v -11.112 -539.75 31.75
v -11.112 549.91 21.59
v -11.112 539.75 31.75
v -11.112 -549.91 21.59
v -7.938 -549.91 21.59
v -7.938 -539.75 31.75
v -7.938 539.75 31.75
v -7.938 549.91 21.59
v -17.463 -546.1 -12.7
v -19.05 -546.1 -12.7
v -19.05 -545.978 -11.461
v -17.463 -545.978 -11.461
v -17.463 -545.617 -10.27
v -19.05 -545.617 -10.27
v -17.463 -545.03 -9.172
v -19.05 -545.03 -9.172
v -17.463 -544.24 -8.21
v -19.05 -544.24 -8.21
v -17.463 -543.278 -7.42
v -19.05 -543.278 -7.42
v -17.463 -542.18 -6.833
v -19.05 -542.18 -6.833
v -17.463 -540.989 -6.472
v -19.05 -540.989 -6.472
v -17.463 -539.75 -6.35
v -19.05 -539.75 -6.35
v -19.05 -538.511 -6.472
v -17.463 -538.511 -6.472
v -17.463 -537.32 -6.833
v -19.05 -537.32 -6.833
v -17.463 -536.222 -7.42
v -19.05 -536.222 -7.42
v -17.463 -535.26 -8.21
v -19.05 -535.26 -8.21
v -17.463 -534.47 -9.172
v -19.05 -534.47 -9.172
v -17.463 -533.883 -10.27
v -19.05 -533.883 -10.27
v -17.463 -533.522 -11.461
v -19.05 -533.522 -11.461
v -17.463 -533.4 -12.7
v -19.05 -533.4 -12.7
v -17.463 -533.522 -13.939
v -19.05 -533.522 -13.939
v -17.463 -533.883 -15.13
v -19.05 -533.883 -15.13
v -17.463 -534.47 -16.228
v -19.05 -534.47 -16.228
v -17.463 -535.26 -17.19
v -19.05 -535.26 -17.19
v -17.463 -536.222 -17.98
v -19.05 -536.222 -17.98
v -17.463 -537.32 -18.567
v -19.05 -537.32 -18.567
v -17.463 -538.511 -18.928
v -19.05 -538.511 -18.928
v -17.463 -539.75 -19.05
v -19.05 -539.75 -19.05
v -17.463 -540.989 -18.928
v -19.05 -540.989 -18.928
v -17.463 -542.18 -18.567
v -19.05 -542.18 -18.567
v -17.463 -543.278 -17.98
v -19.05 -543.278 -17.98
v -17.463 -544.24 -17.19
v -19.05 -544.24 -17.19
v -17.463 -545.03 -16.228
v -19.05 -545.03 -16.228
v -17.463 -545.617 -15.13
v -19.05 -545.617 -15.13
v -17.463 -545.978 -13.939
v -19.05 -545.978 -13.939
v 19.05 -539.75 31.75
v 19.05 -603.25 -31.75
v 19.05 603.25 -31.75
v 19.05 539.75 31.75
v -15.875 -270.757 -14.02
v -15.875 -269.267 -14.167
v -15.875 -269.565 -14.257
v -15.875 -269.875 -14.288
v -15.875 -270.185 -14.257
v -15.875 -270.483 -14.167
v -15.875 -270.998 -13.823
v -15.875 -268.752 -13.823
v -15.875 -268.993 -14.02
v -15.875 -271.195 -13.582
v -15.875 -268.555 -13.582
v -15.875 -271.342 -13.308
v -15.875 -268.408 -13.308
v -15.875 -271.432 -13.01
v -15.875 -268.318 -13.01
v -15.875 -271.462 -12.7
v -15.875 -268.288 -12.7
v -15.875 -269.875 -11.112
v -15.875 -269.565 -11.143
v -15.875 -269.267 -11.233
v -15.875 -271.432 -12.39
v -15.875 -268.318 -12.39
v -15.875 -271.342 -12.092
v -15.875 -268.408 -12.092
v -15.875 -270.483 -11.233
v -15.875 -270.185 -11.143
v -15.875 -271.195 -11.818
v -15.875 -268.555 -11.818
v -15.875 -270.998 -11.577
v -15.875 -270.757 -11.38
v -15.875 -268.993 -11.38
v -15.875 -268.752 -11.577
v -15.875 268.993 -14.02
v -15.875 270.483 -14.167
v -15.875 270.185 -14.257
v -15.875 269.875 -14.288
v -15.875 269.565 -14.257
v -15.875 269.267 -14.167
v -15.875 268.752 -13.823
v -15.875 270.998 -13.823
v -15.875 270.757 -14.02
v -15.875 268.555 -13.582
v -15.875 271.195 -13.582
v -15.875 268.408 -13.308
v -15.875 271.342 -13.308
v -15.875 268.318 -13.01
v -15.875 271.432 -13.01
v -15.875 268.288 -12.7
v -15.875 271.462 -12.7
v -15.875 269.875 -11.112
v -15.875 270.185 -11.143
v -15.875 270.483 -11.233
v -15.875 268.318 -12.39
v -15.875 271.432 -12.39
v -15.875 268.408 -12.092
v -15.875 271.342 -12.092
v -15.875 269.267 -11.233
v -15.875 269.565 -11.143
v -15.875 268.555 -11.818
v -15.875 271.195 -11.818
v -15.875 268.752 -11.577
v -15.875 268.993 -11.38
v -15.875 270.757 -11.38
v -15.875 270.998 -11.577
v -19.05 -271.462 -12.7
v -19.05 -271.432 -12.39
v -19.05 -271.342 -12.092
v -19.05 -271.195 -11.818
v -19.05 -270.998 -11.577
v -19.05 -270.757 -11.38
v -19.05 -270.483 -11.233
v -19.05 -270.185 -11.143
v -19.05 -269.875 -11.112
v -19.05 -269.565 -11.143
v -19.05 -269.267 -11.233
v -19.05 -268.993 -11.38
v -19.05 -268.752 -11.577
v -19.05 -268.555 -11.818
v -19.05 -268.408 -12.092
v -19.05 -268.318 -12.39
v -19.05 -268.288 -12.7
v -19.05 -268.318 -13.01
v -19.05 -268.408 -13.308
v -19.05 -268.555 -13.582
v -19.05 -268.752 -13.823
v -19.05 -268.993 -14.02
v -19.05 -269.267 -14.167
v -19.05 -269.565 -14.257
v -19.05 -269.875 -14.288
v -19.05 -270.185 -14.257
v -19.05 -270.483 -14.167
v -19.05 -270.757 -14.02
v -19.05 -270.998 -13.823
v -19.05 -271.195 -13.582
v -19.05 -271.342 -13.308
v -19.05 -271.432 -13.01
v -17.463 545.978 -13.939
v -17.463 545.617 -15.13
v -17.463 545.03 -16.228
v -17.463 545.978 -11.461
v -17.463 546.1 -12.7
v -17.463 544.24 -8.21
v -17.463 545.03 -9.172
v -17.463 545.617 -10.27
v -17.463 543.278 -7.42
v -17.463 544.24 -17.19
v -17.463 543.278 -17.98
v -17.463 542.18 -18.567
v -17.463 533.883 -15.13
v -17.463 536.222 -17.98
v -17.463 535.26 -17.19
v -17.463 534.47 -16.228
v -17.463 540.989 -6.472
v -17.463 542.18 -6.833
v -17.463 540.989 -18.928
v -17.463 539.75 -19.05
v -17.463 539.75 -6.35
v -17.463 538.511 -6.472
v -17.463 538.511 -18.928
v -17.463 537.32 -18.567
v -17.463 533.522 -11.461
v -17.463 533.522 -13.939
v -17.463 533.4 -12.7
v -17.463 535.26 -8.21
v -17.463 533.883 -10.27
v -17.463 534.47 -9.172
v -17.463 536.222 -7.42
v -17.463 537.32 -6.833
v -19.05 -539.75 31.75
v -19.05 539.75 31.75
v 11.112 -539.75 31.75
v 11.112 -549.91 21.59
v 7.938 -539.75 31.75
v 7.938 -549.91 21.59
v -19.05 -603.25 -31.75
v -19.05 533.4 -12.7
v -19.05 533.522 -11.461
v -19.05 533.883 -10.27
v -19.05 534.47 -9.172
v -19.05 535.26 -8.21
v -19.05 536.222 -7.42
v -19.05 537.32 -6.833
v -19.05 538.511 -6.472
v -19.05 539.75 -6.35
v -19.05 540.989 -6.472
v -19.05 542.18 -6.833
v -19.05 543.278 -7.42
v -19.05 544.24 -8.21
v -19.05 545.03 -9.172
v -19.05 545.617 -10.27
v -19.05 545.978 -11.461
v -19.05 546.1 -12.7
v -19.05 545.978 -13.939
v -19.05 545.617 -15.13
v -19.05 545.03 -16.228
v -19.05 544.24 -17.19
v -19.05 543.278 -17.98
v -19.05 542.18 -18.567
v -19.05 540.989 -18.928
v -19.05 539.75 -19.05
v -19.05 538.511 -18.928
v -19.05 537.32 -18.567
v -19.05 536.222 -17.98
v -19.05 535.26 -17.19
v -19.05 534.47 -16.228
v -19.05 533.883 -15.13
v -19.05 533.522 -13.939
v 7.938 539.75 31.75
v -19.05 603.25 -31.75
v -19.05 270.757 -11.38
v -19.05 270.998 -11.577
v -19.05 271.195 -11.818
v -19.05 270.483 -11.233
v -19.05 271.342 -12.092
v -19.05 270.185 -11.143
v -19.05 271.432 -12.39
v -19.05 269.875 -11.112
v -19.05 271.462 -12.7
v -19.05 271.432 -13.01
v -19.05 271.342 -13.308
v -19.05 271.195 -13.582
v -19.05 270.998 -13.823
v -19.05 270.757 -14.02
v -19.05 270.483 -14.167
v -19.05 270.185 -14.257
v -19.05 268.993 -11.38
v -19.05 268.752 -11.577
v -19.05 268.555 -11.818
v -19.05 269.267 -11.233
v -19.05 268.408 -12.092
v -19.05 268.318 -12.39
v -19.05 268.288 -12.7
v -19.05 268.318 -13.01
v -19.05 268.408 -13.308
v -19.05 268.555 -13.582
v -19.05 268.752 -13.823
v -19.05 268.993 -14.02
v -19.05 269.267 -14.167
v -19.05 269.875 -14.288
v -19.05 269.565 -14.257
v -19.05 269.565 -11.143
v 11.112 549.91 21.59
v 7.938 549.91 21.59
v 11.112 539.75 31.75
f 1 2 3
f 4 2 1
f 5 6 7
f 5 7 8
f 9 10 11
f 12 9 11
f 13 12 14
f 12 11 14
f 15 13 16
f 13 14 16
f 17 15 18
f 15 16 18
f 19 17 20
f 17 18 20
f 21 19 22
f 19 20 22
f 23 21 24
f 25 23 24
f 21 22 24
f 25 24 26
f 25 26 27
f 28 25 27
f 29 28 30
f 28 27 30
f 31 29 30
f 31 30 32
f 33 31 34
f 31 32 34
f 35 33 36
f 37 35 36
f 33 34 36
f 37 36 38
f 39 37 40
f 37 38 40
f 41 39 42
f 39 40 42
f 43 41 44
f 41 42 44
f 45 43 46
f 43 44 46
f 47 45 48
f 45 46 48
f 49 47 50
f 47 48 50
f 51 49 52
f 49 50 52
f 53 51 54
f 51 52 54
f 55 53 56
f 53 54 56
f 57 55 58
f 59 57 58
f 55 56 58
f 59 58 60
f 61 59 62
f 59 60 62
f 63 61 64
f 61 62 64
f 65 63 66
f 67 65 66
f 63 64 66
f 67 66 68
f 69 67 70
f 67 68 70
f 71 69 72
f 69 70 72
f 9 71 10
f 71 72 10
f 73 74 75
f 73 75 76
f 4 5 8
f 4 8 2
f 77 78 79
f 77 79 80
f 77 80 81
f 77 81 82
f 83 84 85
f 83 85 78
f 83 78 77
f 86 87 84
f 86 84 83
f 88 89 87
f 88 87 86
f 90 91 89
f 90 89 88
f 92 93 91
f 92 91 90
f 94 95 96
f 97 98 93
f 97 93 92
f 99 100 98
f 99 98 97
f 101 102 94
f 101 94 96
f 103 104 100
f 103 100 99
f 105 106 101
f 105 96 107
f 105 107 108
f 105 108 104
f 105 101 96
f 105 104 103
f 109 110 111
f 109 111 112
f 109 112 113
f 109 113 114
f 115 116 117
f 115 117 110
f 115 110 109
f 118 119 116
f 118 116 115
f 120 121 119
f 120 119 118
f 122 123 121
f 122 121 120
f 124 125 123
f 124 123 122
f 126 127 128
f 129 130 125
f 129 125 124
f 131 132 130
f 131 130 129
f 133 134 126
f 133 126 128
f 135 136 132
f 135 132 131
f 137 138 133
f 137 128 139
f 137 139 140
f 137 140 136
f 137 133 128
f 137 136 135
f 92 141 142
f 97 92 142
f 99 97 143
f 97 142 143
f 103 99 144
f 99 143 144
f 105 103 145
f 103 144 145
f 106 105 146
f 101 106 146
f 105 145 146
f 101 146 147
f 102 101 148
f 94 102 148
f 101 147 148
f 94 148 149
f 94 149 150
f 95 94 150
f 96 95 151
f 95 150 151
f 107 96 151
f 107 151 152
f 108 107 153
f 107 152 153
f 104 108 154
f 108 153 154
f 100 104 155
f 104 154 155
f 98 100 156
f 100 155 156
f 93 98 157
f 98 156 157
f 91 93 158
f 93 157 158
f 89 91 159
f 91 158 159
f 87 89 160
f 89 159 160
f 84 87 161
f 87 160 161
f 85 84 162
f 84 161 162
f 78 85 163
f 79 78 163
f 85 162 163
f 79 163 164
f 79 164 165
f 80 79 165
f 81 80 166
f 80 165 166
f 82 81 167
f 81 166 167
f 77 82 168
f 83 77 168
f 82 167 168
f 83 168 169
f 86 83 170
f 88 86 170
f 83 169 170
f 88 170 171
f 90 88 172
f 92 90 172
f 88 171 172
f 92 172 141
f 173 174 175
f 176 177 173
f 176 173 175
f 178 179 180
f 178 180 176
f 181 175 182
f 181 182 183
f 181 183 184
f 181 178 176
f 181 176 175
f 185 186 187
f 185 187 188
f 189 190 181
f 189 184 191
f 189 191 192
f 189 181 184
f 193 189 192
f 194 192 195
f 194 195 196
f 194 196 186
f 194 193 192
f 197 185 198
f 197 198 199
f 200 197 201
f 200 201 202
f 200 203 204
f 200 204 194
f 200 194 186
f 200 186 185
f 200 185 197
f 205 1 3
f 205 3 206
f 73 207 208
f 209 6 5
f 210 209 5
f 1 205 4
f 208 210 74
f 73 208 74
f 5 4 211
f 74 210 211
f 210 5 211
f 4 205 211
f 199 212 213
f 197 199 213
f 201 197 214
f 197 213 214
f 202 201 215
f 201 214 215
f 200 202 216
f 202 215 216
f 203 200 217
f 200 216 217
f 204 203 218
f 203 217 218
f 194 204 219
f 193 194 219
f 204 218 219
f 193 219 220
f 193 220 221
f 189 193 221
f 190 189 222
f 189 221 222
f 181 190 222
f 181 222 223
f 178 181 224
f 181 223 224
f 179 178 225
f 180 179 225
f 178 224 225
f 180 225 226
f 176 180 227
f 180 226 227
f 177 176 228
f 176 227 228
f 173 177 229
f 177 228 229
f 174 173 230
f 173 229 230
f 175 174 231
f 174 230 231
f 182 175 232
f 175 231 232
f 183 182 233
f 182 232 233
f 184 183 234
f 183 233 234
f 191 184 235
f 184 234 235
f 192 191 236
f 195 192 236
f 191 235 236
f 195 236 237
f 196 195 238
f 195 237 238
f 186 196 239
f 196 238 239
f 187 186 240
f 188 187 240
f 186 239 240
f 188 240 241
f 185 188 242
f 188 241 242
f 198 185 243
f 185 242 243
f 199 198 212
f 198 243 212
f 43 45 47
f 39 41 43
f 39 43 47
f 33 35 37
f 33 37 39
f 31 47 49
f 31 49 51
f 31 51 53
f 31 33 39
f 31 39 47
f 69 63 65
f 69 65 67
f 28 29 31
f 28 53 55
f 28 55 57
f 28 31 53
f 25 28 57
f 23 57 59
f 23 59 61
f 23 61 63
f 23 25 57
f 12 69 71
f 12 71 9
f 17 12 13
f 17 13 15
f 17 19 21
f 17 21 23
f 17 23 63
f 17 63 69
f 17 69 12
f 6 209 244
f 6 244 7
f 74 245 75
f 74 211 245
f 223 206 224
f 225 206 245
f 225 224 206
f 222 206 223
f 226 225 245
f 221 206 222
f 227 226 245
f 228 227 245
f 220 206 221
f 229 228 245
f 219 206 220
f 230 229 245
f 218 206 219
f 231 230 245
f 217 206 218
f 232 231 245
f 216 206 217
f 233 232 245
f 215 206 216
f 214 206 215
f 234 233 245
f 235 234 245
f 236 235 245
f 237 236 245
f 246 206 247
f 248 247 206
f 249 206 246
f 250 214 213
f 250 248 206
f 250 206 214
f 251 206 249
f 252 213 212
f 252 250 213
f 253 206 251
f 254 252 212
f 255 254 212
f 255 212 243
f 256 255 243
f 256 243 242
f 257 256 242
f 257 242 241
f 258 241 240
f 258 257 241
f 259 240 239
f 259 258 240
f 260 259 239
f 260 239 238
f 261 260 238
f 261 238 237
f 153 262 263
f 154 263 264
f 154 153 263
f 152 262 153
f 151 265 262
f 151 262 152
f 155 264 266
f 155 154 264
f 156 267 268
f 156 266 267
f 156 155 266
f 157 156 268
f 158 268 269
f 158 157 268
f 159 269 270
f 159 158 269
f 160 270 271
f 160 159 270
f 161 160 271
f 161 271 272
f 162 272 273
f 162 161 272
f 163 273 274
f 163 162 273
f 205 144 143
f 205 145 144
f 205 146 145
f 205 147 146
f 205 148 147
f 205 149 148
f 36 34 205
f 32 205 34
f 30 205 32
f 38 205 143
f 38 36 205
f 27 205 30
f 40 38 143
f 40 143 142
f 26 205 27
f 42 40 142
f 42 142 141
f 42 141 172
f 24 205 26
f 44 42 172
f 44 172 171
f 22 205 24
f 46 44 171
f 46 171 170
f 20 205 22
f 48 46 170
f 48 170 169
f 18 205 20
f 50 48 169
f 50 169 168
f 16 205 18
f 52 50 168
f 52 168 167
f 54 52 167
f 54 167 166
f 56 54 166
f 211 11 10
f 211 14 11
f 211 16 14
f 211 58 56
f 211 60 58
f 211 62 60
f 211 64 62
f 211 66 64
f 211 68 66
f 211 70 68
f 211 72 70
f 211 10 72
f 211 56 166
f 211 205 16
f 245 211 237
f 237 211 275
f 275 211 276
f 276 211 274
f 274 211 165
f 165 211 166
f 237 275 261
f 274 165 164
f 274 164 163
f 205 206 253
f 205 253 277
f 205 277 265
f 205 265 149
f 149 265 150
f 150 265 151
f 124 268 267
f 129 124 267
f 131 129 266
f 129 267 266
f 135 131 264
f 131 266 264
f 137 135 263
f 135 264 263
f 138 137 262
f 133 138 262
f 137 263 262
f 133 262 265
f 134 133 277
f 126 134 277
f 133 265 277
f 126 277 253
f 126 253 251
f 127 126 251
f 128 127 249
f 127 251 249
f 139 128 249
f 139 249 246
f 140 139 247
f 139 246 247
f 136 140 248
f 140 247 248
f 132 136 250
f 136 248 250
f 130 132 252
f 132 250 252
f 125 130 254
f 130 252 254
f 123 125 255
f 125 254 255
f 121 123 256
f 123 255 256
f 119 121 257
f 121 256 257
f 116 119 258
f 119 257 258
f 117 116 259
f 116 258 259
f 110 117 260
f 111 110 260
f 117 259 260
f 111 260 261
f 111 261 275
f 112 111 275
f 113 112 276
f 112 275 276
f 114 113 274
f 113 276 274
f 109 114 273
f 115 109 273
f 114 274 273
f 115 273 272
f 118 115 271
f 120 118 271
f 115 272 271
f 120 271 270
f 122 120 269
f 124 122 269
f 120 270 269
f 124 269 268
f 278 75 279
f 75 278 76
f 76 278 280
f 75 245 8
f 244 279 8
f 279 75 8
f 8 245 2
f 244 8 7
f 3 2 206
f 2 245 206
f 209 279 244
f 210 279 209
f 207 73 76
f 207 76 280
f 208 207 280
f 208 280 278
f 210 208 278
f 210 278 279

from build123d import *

# Parameters (mm, degrees)
F1_DEPTH = 603.25
F3_DEPTH = 38.101
F4_R     = 6.35
F5_DEPTH = 1.5875
F6_R     = 1.5875
F7_DEPTH = 3.175


with BuildPart() as f1:
    # F0 (on Front) → F1 (new body, symmetric)
    with BuildSketch(Plane.XZ):
        Polygon((-19.05, -31.75), (19.05, -31.75), (19.05, 31.75), (11.1125, 31.75), (11.1125, 21.59), (7.9375, 21.59), (7.9375, 31.75), (-7.9375, 31.75), (-7.9375, 21.59), (-11.1125, 21.59), (-11.1125, 31.75), (-19.05, 31.75), align=None)
    extrude(amount=F1_DEPTH, both=True)

    # F2 (on face) → F3 (cut, through all)
    with BuildSketch(Plane(origin=(-19.05, 0, 0), x_dir=(0, -1, 0), z_dir=(-1, 0, 0))):
        Polygon((539.75, 31.75), (603.25, -31.75), (603.25, 31.75), align=None)
        Polygon((-603.25, 31.75), (-603.25, -31.75), (-539.75, 31.75), align=None)
    extrude(amount=-F3_DEPTH, mode=Mode.SUBTRACT)

    # F4 (on face) → F5 (cut)
    with BuildSketch(Plane(origin=(-19.05, 0, 0), x_dir=(0, -1, 0), z_dir=(-1, 0, 0))):
        with Locations((539.75, -12.7)):
            Circle(F4_R)
        with Locations((-539.75, -12.7)):
            Circle(F4_R)
    extrude(amount=-F5_DEPTH, mode=Mode.SUBTRACT)

    # F6 (on face) → F7 (cut)
    with BuildSketch(Plane(origin=(-19.05, 0, 0), x_dir=(0, -1, 0), z_dir=(-1, 0, 0))):
        with Locations((269.875, -12.7)):
            Circle(F6_R)
        with Locations((-269.875, -12.7)):
            Circle(F6_R)
    extrude(amount=-F7_DEPTH, mode=Mode.SUBTRACT)


solid = f1.part
